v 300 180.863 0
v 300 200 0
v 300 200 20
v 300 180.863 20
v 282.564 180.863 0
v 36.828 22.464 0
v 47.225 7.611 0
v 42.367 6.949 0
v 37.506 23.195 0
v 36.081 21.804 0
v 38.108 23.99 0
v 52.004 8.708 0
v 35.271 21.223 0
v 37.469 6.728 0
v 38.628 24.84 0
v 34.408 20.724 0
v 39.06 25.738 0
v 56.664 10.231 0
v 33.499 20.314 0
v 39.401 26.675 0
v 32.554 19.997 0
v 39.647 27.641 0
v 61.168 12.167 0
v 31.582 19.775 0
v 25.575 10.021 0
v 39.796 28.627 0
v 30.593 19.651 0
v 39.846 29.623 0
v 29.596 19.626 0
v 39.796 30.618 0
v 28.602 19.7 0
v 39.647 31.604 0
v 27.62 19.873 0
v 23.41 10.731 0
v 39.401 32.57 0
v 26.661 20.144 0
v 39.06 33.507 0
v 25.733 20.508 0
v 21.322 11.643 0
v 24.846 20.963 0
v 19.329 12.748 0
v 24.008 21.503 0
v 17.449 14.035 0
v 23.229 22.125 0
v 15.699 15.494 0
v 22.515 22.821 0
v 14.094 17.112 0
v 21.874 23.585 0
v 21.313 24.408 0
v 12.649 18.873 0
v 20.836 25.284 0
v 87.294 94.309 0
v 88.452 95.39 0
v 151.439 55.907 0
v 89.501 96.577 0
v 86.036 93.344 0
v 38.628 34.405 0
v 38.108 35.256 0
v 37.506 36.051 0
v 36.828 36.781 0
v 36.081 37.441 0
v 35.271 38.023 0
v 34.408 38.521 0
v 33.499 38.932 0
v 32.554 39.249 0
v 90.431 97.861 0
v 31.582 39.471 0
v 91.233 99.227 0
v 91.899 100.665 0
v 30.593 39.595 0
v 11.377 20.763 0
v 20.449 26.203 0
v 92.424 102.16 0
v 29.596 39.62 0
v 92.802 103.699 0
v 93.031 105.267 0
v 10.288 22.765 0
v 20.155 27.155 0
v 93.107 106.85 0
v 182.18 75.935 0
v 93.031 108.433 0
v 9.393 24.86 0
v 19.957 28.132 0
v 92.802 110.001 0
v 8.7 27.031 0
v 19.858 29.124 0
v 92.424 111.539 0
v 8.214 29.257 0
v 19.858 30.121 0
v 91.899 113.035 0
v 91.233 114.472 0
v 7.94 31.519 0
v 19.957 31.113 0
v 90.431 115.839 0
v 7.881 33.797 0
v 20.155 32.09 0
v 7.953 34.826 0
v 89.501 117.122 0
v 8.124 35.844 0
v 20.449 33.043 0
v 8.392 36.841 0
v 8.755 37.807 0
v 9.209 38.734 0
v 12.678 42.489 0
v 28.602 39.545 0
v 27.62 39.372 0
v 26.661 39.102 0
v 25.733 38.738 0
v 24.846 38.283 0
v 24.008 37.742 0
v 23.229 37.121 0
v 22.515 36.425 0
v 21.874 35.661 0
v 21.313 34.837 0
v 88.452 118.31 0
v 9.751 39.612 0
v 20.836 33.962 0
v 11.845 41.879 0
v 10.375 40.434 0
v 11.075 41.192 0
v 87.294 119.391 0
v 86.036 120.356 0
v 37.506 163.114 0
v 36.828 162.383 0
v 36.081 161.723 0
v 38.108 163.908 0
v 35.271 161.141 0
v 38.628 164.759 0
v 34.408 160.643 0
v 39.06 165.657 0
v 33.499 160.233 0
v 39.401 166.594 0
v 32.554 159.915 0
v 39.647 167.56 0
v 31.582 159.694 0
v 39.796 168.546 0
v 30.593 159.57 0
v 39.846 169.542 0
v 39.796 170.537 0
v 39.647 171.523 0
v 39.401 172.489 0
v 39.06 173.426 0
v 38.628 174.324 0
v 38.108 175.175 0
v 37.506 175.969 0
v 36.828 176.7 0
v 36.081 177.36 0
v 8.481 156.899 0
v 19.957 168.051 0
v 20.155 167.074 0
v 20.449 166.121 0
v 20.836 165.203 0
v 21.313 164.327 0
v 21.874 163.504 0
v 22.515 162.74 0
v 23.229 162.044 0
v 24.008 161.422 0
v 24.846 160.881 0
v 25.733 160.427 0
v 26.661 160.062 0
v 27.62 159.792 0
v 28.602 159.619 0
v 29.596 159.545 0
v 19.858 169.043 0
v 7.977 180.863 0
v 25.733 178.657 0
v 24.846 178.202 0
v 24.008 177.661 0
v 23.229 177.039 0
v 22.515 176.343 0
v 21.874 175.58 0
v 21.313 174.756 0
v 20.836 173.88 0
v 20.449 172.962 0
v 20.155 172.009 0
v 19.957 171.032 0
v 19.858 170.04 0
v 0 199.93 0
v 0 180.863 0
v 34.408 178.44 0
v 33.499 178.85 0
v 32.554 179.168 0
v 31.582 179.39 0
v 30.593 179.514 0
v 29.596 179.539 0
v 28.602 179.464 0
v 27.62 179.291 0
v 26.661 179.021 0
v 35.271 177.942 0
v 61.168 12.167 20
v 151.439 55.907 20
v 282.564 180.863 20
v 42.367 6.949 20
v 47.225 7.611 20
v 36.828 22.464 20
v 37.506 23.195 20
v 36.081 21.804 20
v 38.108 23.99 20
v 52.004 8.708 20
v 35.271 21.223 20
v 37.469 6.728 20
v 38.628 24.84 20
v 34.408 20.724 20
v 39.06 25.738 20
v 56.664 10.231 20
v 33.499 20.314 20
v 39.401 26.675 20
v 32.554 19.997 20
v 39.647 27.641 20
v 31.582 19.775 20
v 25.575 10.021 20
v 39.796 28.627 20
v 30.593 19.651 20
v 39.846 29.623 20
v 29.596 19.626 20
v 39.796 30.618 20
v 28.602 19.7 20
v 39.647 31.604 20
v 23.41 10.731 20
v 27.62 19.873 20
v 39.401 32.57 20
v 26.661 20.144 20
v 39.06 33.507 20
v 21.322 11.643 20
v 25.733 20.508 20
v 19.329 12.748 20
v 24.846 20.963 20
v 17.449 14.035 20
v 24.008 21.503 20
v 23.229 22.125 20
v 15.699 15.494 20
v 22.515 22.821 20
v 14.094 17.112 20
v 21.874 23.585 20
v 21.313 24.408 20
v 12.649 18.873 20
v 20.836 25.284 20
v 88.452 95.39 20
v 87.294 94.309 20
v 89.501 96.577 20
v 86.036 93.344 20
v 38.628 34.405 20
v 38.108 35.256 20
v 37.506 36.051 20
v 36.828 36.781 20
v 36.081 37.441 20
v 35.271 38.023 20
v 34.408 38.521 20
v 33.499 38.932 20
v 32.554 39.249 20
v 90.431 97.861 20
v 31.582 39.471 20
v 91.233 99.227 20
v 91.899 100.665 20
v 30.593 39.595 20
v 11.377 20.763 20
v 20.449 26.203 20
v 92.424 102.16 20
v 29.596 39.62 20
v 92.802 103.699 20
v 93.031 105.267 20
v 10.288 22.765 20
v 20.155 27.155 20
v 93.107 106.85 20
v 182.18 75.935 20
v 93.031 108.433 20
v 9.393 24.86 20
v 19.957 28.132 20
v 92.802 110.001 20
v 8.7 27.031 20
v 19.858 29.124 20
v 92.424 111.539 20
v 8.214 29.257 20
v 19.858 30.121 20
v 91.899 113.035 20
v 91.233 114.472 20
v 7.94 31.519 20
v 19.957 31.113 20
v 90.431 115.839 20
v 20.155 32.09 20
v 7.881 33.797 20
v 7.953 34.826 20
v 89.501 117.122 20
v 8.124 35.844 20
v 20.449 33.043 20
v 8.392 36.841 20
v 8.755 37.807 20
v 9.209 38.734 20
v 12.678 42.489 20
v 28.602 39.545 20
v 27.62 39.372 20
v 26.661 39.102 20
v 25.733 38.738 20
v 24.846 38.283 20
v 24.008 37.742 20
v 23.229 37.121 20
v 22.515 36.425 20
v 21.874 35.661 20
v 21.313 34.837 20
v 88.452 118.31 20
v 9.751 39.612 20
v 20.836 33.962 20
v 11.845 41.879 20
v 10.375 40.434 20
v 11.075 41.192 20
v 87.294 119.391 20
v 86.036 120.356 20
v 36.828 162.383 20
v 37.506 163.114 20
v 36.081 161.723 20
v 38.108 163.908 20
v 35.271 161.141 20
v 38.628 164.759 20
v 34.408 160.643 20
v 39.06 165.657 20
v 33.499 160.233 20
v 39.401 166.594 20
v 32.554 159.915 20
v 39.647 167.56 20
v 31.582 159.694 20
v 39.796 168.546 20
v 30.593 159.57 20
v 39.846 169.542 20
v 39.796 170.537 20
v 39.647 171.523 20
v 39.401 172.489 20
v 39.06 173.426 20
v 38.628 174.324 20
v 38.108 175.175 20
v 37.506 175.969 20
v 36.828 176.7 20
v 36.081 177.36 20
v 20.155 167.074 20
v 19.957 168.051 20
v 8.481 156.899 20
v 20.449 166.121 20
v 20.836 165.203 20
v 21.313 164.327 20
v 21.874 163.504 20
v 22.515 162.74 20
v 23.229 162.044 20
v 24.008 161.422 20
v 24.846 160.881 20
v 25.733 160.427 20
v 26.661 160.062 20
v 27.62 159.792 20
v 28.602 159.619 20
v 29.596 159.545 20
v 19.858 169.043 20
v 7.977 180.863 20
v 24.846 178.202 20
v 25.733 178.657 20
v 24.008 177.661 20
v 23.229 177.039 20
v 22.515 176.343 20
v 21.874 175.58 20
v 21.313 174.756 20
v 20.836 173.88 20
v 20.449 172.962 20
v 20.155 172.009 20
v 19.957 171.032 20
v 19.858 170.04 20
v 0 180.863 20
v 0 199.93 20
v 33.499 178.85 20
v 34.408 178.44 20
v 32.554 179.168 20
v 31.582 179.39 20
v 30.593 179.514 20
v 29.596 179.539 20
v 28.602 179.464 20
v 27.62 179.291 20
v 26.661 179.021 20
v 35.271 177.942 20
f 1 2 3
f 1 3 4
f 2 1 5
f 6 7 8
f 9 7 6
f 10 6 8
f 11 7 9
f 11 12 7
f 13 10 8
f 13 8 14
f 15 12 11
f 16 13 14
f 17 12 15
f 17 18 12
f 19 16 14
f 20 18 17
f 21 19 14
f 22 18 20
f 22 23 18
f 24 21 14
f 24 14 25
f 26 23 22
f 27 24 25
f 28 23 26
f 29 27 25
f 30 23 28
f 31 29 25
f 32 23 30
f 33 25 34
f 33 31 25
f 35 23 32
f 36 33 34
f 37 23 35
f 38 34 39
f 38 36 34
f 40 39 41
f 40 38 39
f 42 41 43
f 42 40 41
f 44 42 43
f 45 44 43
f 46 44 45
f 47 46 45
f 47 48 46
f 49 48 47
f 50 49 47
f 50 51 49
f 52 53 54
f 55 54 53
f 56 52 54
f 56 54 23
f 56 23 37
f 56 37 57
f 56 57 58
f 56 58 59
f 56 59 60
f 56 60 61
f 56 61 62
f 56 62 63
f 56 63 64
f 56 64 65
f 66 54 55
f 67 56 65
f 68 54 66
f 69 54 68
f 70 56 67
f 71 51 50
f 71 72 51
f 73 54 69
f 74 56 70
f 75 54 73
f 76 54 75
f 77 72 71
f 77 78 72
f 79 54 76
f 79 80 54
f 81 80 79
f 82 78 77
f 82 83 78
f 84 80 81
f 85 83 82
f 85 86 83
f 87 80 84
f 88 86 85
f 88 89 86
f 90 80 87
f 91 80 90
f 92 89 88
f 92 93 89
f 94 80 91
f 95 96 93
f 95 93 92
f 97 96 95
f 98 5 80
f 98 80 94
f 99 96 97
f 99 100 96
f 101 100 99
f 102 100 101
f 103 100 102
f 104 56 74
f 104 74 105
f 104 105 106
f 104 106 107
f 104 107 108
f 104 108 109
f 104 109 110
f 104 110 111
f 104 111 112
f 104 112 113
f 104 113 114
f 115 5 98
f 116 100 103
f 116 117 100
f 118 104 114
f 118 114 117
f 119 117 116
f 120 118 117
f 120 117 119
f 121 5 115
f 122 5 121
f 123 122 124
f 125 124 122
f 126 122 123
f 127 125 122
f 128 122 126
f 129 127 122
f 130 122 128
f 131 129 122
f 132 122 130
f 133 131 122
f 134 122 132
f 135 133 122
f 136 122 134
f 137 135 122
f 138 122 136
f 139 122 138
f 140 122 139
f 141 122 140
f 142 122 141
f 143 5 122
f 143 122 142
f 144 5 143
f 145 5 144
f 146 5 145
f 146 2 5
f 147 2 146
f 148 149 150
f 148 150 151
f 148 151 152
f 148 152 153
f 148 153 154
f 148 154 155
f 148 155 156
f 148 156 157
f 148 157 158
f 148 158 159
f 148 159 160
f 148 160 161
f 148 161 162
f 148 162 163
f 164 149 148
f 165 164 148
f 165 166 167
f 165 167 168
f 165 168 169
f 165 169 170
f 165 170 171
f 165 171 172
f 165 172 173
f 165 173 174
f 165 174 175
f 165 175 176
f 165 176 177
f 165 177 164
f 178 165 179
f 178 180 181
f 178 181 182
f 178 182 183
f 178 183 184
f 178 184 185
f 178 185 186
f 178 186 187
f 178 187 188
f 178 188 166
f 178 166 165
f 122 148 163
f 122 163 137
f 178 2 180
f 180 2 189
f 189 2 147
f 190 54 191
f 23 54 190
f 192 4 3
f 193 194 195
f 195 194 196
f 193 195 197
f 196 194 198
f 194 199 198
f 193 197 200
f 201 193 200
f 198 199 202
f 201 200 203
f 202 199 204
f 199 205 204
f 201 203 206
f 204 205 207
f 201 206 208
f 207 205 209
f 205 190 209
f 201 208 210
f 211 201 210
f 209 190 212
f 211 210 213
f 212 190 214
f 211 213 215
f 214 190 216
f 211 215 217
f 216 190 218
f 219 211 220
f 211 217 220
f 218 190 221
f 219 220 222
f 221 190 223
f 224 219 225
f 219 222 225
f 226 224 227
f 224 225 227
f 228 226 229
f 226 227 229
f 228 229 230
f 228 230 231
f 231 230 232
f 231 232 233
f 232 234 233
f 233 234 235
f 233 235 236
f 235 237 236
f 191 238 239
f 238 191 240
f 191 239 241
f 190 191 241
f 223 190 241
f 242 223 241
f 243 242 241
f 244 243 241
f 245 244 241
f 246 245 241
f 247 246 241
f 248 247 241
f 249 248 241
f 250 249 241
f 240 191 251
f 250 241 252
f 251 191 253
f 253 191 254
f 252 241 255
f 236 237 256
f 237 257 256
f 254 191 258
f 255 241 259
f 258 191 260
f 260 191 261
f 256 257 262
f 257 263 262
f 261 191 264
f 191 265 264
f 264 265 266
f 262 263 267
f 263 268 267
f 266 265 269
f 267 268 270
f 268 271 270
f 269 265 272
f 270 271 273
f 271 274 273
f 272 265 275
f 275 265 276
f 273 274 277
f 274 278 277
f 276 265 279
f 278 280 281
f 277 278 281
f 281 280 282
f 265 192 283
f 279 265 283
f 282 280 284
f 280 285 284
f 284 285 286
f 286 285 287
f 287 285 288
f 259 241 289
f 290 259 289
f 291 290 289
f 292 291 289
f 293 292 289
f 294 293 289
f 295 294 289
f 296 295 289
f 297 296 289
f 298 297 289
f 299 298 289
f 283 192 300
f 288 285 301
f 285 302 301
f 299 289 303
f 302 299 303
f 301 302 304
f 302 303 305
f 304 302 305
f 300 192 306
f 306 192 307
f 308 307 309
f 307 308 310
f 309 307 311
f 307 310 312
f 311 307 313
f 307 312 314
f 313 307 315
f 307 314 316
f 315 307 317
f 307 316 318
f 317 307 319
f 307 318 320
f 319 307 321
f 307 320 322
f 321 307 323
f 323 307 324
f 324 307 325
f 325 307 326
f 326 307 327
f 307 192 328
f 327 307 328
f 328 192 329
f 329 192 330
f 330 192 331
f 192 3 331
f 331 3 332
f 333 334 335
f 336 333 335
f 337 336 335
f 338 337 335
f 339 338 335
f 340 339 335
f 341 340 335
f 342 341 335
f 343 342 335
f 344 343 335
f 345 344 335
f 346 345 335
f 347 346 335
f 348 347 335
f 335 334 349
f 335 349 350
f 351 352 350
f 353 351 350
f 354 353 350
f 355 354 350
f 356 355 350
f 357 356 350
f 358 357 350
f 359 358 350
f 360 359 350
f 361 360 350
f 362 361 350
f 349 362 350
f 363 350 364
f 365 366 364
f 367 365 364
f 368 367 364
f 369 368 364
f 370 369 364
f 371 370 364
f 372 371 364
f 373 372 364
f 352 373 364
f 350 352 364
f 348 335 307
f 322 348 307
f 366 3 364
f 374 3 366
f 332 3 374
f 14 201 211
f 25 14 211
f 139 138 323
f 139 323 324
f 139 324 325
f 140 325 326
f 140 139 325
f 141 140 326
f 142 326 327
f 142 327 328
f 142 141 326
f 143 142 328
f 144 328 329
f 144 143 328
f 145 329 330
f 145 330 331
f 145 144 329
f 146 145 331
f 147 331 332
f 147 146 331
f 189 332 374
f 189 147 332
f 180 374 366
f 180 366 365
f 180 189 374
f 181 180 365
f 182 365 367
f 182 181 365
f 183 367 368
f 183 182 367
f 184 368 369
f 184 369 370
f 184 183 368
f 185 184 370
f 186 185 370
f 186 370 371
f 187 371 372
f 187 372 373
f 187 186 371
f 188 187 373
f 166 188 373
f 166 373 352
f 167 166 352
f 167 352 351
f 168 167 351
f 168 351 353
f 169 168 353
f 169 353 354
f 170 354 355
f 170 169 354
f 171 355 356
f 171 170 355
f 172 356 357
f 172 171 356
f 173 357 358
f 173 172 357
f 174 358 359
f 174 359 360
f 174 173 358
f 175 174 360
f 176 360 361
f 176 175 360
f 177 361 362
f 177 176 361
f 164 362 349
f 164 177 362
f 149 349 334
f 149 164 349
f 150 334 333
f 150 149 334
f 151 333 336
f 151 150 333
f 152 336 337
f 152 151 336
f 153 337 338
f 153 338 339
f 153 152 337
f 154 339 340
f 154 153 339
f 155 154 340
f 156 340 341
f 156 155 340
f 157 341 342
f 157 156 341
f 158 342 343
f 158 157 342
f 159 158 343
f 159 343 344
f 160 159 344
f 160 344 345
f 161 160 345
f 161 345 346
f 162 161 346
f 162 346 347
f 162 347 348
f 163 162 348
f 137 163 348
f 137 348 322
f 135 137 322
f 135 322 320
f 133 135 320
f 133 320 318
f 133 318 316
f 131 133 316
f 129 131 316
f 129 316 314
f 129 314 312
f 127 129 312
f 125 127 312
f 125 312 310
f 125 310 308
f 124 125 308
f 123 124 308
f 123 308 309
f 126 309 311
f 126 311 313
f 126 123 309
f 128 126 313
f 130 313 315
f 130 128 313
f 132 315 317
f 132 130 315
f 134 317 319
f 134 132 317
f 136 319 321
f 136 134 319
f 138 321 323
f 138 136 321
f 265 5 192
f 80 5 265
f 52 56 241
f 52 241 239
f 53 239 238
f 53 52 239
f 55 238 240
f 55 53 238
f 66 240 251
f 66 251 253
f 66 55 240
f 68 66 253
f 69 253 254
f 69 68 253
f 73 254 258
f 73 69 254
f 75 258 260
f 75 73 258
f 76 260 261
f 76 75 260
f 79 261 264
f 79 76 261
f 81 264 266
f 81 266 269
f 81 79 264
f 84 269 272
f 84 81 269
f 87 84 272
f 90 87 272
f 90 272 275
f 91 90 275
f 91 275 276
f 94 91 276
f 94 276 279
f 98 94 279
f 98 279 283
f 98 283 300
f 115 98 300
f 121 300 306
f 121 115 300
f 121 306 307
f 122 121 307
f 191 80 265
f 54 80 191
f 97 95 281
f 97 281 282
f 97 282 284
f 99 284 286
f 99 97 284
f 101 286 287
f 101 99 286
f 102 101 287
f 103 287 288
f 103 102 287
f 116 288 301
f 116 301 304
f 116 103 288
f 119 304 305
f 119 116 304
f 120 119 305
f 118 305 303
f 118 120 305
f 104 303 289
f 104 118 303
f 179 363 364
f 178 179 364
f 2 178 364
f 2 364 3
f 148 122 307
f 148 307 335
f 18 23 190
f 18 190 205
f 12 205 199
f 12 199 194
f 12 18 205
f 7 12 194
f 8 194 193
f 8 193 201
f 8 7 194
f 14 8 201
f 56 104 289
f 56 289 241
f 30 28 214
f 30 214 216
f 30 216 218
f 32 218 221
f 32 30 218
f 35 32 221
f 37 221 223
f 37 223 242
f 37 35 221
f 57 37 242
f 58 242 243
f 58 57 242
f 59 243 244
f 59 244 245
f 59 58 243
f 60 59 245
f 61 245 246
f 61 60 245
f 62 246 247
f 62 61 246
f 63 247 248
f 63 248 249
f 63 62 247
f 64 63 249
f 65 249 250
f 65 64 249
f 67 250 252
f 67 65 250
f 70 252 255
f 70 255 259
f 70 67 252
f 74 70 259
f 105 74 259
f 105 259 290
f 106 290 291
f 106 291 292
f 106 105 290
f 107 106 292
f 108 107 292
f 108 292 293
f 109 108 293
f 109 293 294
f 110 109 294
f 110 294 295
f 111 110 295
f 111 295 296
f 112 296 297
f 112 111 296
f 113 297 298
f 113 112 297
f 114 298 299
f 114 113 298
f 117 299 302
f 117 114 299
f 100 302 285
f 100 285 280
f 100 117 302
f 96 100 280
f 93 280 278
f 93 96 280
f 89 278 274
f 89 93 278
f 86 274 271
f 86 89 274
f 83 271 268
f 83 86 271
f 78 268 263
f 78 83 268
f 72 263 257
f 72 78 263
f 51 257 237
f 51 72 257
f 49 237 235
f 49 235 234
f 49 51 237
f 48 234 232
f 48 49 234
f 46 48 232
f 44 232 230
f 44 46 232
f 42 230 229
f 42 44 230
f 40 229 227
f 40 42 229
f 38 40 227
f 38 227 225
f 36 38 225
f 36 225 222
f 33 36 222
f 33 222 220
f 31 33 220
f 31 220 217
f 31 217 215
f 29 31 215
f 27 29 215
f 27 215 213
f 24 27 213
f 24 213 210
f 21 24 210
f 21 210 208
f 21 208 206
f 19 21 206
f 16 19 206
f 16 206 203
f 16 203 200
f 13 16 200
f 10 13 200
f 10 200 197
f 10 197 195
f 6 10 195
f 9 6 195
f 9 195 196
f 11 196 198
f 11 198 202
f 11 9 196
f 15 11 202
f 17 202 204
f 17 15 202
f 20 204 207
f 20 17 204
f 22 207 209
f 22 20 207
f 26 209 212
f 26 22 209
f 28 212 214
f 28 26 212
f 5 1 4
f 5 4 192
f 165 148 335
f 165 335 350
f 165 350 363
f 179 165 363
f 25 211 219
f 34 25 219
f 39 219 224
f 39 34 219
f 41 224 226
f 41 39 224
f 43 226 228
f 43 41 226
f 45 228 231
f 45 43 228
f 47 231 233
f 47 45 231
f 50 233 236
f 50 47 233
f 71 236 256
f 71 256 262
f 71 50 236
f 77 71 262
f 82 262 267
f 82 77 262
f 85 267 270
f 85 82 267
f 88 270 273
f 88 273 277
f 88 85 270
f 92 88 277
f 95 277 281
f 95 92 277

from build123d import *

# Parameters (mm, degrees)
SZKIC3_R                    = 10
DODANIE_WYCI_GNI_CIE2_DEPTH = 20


with BuildPart() as part:
    # Szkic3 → Dodanie-wyciągnięcie2 (new body)
    with BuildSketch(Plane.XY):
        with BuildLine():
            Line((12.67810929, 42.488794767), (86.036422739, 93.344089821))
            ThreePointArc((86.036422739, 93.344089821), (93.107358396, 106.849857247), (86.036422739, 120.355624672))
            Line((86.036422739, 120.355624672), (8.481056429, 156.898555423))
            Line((8.481056429, 156.898555423), (7.976636035, 180.8633929))
            Line((7.976636035, 180.8633929), (0, 180.8633929))
            Line((0, 180.8633929), (0, 199.930223275))
            Line((0, 199.930223275), (300, 200))
            Line((300, 200), (300, 180.8633929))
            Line((300, 180.8633929), (282.564213809, 180.8633929))
            Line((282.564213809, 180.8633929), (182.180079392, 75.935133422))
            Line((182.180079392, 75.935133422), (151.439346205, 55.907468715))
            Line((151.439346205, 55.907468715), (61.168077446, 12.167426414))
            ThreePointArc((61.168077446, 12.167426414), (49.626578665, 8.105505852), (37.468922524, 6.72826588))
            Line((37.468922524, 6.72826588), (25.574803596, 10.020549368))
            ThreePointArc((25.574803596, 10.020549368), (12.6494554, 18.873421693), (7.881217502, 33.796621141))
            ThreePointArc((7.881217502, 33.796621141), (9.209095866, 38.733514905), (12.67810929, 42.488794767))
        make_face()
        with Locations((29.845610796, 29.622773701)):
            Circle(SZKIC3_R, mode=Mode.SUBTRACT)
        with Locations((29.845610796, 169.541616803)):
            Circle(SZKIC3_R, mode=Mode.SUBTRACT)
    extrude(amount=DODANIE_WYCI_GNI_CIE2_DEPTH)


solid = part.part
